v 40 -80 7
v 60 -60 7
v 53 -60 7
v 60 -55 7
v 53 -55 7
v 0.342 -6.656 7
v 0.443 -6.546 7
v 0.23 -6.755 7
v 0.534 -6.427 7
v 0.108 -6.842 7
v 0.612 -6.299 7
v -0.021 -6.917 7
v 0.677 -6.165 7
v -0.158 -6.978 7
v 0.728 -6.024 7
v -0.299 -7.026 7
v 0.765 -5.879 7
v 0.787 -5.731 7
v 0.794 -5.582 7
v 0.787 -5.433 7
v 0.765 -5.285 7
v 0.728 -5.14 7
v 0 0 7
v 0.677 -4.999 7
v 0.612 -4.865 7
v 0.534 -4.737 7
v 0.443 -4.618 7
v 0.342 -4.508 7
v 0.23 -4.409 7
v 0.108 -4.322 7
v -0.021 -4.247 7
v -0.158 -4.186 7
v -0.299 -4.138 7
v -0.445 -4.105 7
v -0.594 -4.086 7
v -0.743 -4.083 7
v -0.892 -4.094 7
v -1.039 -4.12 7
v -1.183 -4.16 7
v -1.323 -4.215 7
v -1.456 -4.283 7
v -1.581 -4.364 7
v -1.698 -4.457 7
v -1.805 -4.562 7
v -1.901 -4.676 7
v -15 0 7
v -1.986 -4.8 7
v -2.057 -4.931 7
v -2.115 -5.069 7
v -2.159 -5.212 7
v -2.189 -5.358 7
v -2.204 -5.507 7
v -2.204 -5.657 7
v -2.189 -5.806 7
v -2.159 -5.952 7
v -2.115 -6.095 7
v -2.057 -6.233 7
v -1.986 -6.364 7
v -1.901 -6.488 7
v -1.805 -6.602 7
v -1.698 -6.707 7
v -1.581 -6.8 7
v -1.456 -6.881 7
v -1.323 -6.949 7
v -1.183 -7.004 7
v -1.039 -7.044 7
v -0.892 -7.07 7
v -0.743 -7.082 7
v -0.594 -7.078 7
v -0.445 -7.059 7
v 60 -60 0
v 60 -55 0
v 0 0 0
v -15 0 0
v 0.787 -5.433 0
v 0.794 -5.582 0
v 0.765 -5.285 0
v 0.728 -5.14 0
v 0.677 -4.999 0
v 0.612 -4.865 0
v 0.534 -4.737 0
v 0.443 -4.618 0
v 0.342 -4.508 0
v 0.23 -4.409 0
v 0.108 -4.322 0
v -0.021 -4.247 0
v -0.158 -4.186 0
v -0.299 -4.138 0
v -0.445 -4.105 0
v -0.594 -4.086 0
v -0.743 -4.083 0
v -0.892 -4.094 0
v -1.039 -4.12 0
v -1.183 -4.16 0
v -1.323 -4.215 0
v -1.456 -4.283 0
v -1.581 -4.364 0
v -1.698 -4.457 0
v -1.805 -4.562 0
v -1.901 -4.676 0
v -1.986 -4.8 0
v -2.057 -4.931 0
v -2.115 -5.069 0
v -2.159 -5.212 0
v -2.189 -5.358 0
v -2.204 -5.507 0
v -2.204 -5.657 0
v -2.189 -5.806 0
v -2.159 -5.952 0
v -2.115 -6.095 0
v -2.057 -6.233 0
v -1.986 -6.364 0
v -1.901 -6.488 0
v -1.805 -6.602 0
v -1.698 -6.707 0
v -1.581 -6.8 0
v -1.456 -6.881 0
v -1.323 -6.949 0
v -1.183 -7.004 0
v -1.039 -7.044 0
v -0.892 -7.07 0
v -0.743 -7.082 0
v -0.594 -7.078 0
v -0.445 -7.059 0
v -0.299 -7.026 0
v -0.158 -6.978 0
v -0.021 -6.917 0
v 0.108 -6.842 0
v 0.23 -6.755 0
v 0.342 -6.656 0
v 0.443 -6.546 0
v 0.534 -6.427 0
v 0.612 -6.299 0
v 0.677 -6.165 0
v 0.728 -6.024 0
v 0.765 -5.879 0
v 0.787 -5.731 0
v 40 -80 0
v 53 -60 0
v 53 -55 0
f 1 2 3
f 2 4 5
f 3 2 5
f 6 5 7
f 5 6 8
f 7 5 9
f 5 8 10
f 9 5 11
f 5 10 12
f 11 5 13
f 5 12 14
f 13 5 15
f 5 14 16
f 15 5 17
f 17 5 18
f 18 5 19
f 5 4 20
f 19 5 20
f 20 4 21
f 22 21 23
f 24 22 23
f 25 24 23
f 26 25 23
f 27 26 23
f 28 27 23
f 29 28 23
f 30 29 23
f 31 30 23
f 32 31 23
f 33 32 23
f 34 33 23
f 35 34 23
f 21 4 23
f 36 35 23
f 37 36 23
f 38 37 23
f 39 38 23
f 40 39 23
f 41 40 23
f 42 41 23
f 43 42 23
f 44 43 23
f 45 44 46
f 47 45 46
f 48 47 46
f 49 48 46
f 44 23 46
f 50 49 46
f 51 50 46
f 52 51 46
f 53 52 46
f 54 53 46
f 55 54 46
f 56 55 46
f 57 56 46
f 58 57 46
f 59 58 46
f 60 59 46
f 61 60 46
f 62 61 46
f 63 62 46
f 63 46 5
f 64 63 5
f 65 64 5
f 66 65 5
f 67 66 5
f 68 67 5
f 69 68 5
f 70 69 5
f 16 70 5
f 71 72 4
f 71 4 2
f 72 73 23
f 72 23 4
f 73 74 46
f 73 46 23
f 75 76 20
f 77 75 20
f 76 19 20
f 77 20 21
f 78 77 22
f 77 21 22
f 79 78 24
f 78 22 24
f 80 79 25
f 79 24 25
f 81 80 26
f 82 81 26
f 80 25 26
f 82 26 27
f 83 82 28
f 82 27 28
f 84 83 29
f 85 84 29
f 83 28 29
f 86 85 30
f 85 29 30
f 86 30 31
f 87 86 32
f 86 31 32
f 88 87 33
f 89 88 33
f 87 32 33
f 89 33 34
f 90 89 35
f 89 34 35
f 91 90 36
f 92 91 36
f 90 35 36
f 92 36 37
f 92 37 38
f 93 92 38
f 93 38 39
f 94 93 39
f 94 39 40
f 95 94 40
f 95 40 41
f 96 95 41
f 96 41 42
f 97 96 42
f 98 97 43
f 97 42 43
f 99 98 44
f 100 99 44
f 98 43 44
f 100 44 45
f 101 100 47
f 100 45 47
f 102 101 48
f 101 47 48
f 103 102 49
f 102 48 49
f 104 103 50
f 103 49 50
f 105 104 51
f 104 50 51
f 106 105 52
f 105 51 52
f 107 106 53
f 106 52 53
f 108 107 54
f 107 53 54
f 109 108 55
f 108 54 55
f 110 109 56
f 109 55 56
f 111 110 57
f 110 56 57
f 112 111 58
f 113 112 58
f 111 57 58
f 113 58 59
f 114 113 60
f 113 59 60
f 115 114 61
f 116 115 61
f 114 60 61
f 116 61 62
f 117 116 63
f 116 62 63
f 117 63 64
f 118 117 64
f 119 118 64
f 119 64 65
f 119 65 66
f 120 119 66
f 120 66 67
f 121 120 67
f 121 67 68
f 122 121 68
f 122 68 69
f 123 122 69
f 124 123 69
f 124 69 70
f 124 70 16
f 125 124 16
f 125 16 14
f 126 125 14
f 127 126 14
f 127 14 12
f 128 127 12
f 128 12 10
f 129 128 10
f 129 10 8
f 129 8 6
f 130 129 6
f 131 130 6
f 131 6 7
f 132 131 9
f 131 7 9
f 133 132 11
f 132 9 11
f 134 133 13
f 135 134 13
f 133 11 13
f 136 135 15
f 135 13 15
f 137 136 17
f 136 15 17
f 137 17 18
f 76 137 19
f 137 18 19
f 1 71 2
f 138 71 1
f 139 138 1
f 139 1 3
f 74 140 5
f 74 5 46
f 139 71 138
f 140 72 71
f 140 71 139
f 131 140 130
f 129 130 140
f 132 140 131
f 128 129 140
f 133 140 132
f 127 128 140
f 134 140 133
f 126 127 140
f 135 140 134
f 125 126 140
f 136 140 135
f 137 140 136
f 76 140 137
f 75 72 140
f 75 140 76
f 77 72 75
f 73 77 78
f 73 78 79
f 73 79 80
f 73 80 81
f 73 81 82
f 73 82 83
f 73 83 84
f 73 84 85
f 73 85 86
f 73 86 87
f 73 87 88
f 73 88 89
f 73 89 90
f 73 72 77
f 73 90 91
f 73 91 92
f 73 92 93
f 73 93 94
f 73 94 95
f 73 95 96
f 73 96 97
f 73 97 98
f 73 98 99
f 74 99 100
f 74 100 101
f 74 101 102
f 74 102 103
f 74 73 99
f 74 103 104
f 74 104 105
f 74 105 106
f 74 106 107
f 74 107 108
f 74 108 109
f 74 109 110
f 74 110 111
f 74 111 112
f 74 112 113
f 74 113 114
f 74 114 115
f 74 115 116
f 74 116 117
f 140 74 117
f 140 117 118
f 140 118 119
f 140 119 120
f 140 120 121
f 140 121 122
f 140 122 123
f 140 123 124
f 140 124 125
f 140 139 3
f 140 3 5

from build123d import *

# Parameters (mm, degrees)
BOSS_EXTRUDE1_DEPTH = 7
SKETCH2_R           = 1.5
CUT_EXTRUDE3_DEPTH  = 7.5


with BuildPart() as part:
    # Sketch1 → Boss-Extrude1 (new body)
    with BuildSketch(Plane.XY):
        Polygon((0, 0), (60, -55), (60, -60), (40, -80), (53, -60), (53, -55), (-15, 0), align=None)
    extrude(amount=BOSS_EXTRUDE1_DEPTH)

    # Sketch2 → Cut-Extrude3 (cut, symmetric)
    with BuildSketch(Plane.XY.offset(7)):
        with Locations((-0.705610521, -5.582063241)):
            Circle(SKETCH2_R)
    extrude(amount=CUT_EXTRUDE3_DEPTH, both=True, mode=Mode.SUBTRACT)


solid = part.part
